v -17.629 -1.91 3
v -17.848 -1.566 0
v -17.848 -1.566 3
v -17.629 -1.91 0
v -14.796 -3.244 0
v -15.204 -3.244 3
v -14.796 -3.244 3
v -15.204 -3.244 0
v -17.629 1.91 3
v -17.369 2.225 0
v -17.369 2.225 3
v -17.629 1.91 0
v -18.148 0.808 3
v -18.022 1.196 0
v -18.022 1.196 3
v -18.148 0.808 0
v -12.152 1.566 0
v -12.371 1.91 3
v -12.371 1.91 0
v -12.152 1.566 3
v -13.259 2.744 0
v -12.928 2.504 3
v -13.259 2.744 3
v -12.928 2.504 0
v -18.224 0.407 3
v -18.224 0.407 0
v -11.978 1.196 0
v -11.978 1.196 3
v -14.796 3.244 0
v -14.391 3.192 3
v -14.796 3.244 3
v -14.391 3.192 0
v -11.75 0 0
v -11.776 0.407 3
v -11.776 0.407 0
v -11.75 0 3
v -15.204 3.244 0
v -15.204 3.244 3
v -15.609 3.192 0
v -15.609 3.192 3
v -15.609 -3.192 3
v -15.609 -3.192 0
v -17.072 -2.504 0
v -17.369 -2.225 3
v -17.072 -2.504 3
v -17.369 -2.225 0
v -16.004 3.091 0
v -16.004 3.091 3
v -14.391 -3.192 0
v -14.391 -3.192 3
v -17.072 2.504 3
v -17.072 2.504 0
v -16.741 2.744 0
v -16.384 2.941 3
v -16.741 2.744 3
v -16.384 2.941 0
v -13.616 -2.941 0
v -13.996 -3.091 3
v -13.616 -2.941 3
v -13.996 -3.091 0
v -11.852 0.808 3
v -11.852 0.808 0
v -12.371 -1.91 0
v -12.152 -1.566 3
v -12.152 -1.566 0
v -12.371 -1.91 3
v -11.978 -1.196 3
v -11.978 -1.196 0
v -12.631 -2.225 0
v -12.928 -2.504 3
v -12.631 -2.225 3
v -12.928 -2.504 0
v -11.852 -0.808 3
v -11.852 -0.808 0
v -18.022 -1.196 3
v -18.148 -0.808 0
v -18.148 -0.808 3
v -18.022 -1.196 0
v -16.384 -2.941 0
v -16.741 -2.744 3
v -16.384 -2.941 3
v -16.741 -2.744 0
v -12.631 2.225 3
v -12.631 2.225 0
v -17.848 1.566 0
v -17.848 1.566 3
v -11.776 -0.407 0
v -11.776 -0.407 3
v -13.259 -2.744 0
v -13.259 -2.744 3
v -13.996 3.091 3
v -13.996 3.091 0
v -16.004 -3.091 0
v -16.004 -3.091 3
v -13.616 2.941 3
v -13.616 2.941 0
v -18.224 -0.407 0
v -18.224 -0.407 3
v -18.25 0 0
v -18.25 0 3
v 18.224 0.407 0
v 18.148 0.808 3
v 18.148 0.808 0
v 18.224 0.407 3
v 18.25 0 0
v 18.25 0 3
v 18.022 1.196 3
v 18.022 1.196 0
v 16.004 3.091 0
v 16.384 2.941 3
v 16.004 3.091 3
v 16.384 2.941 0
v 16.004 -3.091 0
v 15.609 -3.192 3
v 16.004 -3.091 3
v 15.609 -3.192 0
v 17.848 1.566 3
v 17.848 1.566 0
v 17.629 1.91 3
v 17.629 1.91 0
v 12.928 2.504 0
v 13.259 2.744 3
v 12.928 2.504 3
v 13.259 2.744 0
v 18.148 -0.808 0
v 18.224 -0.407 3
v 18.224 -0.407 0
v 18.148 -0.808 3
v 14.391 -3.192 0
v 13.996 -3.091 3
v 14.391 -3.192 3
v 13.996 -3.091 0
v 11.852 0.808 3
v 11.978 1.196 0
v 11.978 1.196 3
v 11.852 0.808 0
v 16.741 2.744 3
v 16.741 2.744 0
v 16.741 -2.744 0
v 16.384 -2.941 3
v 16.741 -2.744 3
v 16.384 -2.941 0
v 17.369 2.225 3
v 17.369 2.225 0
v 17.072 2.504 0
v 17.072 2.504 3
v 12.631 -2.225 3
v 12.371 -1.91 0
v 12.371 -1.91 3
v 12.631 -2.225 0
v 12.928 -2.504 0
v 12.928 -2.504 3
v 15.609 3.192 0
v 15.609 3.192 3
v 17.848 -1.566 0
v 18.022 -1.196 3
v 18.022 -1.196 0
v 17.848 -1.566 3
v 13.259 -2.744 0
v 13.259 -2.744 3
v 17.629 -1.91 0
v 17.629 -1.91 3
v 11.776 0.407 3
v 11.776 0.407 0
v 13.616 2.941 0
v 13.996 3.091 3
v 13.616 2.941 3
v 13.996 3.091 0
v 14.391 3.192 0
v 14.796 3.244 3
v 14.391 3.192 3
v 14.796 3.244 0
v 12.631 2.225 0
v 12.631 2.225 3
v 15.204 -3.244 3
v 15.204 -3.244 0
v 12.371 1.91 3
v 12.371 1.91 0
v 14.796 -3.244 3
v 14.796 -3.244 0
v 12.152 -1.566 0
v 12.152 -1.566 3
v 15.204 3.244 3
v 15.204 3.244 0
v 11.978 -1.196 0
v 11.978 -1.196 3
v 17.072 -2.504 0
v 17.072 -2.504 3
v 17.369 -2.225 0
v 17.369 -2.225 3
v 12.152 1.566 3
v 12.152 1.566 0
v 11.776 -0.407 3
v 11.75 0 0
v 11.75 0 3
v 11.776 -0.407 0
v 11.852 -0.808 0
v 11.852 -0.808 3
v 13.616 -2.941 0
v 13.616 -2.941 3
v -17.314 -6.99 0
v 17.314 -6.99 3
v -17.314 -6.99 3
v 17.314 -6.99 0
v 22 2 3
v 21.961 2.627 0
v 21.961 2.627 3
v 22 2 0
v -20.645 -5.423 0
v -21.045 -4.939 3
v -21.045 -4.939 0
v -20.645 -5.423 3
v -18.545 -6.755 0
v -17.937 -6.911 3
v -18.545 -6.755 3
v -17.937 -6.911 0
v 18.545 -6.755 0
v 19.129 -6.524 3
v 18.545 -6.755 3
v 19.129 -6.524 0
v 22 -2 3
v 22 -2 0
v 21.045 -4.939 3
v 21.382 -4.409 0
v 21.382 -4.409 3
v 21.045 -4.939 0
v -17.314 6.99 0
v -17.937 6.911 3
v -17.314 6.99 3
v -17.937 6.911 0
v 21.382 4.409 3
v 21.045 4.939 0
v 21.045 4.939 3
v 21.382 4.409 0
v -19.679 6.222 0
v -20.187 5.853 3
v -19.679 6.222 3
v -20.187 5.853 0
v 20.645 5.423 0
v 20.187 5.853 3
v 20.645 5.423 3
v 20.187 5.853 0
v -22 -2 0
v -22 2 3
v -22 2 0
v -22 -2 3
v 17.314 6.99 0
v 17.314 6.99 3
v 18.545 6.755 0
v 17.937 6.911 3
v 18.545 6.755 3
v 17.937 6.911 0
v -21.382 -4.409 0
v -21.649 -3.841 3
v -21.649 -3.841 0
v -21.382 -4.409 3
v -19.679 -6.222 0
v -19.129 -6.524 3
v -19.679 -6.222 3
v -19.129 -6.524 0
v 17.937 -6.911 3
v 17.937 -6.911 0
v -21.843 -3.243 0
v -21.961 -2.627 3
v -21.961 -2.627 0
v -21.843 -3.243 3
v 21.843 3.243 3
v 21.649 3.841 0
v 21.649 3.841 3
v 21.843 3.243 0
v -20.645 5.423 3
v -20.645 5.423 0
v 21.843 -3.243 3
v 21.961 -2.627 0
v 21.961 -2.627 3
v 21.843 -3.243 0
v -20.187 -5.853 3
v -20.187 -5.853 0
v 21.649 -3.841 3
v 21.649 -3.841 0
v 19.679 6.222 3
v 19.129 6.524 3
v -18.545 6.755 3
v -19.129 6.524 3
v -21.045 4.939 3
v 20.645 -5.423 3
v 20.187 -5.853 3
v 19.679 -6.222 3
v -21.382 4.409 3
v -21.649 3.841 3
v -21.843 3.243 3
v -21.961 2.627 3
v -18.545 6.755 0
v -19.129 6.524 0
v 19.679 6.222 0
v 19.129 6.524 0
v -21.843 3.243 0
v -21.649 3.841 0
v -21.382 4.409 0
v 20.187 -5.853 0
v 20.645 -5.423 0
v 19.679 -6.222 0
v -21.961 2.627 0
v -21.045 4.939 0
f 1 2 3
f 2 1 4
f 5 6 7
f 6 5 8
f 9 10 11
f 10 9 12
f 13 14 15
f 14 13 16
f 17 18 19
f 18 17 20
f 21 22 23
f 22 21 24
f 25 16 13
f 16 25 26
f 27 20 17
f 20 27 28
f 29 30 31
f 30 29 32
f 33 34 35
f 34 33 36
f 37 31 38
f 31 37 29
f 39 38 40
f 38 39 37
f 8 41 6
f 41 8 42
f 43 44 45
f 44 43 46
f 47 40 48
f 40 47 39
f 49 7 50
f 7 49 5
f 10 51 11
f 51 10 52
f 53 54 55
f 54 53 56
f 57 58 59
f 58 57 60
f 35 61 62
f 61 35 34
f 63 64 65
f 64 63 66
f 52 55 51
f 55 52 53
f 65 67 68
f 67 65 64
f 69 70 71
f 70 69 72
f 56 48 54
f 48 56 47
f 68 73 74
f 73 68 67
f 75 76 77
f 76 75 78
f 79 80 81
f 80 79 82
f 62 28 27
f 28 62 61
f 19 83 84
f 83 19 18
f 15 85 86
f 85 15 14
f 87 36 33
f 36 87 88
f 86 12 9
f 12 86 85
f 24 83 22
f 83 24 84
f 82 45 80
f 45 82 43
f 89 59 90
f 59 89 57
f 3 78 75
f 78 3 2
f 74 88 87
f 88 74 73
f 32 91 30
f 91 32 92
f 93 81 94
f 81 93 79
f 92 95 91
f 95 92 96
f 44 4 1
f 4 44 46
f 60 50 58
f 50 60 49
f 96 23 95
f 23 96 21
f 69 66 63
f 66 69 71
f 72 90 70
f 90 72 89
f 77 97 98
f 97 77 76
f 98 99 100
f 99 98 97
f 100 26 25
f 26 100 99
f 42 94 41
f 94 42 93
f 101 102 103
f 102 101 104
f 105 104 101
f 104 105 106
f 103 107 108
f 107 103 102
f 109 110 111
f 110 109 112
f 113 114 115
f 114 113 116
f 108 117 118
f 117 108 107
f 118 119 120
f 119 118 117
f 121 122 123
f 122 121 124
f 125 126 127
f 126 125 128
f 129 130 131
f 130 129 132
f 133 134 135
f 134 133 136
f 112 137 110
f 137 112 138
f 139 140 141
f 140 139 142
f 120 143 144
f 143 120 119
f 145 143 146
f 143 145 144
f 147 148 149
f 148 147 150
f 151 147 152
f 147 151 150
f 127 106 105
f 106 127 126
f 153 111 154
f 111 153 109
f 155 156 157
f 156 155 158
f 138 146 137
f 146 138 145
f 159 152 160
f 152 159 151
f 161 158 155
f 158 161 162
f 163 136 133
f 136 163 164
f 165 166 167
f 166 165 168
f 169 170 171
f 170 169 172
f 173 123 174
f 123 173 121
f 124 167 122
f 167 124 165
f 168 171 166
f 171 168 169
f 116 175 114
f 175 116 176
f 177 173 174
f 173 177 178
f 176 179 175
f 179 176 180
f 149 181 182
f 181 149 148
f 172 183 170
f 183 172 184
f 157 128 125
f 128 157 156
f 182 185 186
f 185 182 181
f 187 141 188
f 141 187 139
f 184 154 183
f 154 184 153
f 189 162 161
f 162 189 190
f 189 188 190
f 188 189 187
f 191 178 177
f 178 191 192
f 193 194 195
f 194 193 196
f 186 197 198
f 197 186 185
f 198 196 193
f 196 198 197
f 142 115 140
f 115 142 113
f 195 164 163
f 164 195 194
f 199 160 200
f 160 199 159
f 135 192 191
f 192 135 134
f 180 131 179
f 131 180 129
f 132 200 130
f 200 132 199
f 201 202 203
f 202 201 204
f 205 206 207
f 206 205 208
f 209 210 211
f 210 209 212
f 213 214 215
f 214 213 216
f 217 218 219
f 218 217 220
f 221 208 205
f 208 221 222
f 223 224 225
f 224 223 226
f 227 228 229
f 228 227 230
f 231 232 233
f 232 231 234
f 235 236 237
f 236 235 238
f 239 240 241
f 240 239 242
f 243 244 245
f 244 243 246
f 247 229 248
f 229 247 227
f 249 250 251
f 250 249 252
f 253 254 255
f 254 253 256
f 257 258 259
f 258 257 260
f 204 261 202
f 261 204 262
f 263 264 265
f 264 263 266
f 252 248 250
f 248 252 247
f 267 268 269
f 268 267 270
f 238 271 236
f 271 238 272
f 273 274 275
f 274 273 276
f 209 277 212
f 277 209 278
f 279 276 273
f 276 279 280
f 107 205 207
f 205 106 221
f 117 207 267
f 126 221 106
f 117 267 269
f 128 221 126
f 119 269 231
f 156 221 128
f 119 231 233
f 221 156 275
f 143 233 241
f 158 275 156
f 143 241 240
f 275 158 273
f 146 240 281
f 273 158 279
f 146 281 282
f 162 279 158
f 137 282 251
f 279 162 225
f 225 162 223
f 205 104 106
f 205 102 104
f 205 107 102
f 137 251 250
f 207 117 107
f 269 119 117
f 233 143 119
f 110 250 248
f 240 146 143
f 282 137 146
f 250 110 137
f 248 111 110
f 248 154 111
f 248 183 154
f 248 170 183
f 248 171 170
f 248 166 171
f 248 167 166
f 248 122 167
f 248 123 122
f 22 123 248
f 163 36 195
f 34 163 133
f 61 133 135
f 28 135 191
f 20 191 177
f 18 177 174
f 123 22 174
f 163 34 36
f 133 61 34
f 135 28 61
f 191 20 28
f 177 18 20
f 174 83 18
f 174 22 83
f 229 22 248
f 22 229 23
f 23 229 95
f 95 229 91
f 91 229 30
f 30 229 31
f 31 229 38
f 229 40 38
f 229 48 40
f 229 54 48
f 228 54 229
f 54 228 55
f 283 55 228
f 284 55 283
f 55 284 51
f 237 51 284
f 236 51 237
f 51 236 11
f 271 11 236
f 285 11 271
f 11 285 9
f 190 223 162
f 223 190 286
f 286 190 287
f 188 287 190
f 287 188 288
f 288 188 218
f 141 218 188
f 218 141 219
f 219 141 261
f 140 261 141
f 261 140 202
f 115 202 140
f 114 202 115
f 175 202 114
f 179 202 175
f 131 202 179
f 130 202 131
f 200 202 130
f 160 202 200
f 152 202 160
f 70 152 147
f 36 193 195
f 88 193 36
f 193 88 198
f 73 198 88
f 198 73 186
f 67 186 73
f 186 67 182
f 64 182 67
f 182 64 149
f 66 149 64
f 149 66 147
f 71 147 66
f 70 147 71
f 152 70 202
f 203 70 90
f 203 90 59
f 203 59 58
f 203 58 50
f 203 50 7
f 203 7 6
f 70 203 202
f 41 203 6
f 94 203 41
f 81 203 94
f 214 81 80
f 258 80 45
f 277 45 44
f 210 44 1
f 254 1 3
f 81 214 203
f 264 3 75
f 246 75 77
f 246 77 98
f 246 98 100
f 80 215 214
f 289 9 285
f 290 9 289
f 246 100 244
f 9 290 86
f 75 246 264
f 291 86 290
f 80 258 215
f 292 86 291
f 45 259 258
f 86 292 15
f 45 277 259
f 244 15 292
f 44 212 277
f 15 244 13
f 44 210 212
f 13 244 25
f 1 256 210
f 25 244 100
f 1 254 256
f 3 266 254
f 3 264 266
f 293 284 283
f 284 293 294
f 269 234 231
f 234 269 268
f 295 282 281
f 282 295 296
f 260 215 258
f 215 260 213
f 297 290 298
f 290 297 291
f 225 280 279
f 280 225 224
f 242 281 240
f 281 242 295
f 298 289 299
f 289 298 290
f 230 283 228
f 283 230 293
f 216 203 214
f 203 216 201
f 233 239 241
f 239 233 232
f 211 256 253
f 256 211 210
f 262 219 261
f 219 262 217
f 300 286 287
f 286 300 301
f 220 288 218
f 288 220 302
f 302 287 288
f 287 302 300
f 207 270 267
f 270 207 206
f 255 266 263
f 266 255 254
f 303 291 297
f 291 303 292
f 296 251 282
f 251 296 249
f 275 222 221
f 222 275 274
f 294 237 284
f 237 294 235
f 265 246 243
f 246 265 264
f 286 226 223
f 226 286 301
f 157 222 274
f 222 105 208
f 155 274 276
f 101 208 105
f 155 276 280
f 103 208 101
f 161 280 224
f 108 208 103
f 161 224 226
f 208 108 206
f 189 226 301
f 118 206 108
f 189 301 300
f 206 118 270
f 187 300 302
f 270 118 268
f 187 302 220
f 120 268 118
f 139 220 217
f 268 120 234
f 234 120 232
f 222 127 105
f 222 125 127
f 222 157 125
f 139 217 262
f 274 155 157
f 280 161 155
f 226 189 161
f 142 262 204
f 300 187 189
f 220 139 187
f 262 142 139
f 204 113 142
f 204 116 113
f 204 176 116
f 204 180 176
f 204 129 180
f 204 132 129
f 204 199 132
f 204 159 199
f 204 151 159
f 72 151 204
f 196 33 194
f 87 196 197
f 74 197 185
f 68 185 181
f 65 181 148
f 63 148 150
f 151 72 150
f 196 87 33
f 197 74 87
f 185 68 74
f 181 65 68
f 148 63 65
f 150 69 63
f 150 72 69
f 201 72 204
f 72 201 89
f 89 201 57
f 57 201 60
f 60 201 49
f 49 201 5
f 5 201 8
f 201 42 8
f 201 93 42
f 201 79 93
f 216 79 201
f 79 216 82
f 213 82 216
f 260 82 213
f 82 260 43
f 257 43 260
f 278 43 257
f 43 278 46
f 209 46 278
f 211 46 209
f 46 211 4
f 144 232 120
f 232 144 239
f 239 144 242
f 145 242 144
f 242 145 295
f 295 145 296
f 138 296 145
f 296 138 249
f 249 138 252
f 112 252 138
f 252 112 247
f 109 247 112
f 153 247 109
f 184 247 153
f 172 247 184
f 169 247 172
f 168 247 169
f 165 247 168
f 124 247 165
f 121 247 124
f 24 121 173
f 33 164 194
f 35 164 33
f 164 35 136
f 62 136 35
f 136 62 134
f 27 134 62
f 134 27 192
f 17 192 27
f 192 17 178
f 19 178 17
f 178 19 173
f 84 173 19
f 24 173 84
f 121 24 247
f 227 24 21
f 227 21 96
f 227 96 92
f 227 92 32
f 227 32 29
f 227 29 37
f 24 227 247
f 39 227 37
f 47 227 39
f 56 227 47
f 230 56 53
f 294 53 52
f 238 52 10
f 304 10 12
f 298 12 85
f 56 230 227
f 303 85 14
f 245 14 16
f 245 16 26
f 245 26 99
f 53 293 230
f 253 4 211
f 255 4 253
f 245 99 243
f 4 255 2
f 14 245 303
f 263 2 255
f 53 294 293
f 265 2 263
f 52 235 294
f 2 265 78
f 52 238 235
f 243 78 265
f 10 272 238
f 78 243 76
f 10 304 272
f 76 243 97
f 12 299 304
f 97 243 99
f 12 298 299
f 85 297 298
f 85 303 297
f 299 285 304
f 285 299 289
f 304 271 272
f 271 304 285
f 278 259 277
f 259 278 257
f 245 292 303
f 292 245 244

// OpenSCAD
$fn = 50;


difference() {
	union() {
		hull() {
			translate(v = [-17.0000000000, 2.0000000000, 0]) {
				cylinder(h = 3, r = 5);
			}
			translate(v = [17.0000000000, 2.0000000000, 0]) {
				cylinder(h = 3, r = 5);
			}
			translate(v = [-17.0000000000, -2.0000000000, 0]) {
				cylinder(h = 3, r = 5);
			}
			translate(v = [17.0000000000, -2.0000000000, 0]) {
				cylinder(h = 3, r = 5);
			}
		}
	}
	union() {
		translate(v = [-15.0000000000, 0.0000000000, -100.0000000000]) {
			cylinder(h = 200, r = 3.2500000000);
		}
		translate(v = [-15.0000000000, 0.0000000000, -100.0000000000]) {
			cylinder(h = 200, r = 3.2500000000);
		}
		translate(v = [15.0000000000, 0.0000000000, -100.0000000000]) {
			cylinder(h = 200, r = 3.2500000000);
		}
		translate(v = [15.0000000000, 0.0000000000, -100.0000000000]) {
			cylinder(h = 200, r = 3.2500000000);
		}
	}
}
